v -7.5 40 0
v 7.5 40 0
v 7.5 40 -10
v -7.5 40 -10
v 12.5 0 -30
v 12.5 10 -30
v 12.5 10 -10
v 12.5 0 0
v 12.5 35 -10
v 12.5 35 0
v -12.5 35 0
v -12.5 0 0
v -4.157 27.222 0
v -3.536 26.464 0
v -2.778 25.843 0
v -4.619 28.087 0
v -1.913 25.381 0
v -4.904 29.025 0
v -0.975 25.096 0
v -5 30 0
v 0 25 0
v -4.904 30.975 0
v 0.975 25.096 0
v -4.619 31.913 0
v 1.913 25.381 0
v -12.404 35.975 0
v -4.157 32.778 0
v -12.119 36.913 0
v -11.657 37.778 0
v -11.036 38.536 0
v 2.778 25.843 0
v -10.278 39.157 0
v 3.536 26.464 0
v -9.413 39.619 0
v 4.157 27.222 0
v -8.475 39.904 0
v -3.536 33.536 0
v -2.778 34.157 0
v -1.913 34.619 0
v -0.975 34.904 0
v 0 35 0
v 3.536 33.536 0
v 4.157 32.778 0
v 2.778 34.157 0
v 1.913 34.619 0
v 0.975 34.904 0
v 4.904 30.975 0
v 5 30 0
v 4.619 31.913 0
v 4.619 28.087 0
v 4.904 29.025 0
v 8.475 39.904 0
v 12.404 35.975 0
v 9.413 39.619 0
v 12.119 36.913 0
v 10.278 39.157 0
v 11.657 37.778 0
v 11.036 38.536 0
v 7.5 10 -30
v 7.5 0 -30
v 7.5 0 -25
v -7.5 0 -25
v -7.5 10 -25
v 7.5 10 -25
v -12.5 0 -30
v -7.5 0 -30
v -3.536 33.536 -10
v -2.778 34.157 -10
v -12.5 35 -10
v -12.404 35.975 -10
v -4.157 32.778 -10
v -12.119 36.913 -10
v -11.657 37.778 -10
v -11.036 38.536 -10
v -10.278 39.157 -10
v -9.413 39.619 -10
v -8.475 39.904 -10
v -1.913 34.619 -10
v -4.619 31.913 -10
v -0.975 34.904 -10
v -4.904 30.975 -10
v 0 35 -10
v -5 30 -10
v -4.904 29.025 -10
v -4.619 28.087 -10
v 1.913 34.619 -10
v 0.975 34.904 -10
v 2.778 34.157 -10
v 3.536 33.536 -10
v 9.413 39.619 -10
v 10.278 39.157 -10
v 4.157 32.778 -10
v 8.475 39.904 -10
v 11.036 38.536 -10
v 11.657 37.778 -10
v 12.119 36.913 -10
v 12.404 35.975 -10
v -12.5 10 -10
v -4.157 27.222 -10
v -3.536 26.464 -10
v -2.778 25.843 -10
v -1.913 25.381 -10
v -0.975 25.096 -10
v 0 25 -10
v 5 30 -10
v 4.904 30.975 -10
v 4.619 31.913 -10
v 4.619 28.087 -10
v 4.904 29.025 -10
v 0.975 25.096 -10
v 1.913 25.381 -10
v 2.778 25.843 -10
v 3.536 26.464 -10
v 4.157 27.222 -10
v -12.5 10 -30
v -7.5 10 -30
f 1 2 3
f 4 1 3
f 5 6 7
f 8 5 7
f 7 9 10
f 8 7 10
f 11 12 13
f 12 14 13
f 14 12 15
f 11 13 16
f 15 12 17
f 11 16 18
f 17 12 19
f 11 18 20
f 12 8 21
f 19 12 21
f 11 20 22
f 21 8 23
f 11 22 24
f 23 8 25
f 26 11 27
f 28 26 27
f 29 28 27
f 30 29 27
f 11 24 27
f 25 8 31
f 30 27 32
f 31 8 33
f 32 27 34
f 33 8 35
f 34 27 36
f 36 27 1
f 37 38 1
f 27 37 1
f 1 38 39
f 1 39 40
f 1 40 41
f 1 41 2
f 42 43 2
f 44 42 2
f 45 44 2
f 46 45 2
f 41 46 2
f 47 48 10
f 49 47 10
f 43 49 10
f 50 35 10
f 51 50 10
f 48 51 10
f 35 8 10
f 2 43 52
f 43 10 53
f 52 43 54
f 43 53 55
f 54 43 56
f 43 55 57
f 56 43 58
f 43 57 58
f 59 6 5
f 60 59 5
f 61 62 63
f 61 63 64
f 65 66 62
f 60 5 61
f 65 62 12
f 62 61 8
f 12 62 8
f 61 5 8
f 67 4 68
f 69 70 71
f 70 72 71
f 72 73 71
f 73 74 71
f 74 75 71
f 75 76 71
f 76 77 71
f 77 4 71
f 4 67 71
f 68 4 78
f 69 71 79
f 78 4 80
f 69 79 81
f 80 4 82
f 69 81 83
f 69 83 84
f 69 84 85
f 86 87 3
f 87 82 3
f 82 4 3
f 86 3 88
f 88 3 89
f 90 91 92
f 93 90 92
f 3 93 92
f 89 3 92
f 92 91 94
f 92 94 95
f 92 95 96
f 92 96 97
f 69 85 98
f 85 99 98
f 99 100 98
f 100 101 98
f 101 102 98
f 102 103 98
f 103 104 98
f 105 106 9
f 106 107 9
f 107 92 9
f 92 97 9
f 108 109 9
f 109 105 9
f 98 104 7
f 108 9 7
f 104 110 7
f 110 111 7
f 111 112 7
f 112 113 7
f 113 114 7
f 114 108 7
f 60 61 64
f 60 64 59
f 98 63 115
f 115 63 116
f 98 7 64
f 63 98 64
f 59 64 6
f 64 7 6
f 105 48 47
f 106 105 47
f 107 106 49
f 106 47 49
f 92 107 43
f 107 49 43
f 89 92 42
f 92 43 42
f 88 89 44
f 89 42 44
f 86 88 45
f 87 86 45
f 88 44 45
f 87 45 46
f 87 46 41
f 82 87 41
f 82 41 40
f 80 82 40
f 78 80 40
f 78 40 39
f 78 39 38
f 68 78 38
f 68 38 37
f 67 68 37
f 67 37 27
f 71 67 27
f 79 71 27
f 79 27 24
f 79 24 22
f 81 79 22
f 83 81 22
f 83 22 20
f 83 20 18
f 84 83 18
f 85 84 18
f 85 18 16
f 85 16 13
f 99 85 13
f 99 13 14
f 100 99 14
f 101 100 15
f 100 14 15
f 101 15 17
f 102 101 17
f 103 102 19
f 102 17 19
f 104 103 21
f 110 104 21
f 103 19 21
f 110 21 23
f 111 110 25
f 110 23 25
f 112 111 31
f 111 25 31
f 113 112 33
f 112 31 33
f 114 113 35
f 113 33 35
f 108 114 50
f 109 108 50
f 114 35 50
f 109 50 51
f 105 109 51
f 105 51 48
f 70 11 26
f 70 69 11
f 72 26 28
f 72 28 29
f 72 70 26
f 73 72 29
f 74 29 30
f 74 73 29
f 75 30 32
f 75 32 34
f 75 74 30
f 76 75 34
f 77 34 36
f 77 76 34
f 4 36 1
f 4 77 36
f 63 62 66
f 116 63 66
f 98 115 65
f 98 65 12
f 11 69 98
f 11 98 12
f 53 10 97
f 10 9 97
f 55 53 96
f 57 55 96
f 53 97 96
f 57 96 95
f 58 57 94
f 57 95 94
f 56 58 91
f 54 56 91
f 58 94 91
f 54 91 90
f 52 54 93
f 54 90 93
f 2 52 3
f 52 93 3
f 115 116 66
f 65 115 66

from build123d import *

# Parameters (mm, degrees)
ESTRUSIONE_ESTRUSIONE1_DEPTH  = 12.5
TAGLIO_ESTRUSIONE1_DEPTH      = 45.229515032
TAGLIO_ESTRUSIONE1_DEPTH_BACK = 45.229515032
SCHIZZO2_W                    = 15
SCHIZZO2_H                    = 5
FORO_10_0_10_1_D              = 10
RACCORDO1_R                   = 5


with BuildPart() as part:
    # Schizzo1 → Estrusione-Estrusione1 (new, symmetric)
    with BuildSketch(Plane(origin=(0, 0, 0), x_dir=(0, 0, -1), z_dir=(1, 0, 0))):
        Polygon((0, 0), (0, 40), (10, 40), (10, 10), (30, 10), (30, 0), align=None)
    extrude(amount=ESTRUSIONE_ESTRUSIONE1_DEPTH, both=True)

    # Schizzo2 → Taglio-Estrusione1 (cut, two sides: drawn at the far end of the back side and taken through both)
    with BuildSketch(Plane(origin=(0, 10, 0), x_dir=(1, 0, 0), z_dir=(0, 1, 0)).offset(-TAGLIO_ESTRUSIONE1_DEPTH_BACK)):
        with Locations((0, 27.5)):
            Rectangle(SCHIZZO2_W, SCHIZZO2_H)
    extrude(amount=TAGLIO_ESTRUSIONE1_DEPTH + TAGLIO_ESTRUSIONE1_DEPTH_BACK, mode=Mode.SUBTRACT)

    # Foro Ø10.0 (10)-1 (through all)
    with Locations(Plane(origin=(0, 0, -10), x_dir=(-1, 0, 0), z_dir=(0, 0, -1))):
        with Locations((0, 30)):
            Hole(FORO_10_0_10_1_D / 2)

    # Raccordo1
    raccordo1_edges = [part.edges().sort_by_distance(p)[0] for p in [
        (12.5, 40, -5),
        (-12.5, 40, -5),
    ]]
    fillet(raccordo1_edges, radius=RACCORDO1_R)


solid = part.part
